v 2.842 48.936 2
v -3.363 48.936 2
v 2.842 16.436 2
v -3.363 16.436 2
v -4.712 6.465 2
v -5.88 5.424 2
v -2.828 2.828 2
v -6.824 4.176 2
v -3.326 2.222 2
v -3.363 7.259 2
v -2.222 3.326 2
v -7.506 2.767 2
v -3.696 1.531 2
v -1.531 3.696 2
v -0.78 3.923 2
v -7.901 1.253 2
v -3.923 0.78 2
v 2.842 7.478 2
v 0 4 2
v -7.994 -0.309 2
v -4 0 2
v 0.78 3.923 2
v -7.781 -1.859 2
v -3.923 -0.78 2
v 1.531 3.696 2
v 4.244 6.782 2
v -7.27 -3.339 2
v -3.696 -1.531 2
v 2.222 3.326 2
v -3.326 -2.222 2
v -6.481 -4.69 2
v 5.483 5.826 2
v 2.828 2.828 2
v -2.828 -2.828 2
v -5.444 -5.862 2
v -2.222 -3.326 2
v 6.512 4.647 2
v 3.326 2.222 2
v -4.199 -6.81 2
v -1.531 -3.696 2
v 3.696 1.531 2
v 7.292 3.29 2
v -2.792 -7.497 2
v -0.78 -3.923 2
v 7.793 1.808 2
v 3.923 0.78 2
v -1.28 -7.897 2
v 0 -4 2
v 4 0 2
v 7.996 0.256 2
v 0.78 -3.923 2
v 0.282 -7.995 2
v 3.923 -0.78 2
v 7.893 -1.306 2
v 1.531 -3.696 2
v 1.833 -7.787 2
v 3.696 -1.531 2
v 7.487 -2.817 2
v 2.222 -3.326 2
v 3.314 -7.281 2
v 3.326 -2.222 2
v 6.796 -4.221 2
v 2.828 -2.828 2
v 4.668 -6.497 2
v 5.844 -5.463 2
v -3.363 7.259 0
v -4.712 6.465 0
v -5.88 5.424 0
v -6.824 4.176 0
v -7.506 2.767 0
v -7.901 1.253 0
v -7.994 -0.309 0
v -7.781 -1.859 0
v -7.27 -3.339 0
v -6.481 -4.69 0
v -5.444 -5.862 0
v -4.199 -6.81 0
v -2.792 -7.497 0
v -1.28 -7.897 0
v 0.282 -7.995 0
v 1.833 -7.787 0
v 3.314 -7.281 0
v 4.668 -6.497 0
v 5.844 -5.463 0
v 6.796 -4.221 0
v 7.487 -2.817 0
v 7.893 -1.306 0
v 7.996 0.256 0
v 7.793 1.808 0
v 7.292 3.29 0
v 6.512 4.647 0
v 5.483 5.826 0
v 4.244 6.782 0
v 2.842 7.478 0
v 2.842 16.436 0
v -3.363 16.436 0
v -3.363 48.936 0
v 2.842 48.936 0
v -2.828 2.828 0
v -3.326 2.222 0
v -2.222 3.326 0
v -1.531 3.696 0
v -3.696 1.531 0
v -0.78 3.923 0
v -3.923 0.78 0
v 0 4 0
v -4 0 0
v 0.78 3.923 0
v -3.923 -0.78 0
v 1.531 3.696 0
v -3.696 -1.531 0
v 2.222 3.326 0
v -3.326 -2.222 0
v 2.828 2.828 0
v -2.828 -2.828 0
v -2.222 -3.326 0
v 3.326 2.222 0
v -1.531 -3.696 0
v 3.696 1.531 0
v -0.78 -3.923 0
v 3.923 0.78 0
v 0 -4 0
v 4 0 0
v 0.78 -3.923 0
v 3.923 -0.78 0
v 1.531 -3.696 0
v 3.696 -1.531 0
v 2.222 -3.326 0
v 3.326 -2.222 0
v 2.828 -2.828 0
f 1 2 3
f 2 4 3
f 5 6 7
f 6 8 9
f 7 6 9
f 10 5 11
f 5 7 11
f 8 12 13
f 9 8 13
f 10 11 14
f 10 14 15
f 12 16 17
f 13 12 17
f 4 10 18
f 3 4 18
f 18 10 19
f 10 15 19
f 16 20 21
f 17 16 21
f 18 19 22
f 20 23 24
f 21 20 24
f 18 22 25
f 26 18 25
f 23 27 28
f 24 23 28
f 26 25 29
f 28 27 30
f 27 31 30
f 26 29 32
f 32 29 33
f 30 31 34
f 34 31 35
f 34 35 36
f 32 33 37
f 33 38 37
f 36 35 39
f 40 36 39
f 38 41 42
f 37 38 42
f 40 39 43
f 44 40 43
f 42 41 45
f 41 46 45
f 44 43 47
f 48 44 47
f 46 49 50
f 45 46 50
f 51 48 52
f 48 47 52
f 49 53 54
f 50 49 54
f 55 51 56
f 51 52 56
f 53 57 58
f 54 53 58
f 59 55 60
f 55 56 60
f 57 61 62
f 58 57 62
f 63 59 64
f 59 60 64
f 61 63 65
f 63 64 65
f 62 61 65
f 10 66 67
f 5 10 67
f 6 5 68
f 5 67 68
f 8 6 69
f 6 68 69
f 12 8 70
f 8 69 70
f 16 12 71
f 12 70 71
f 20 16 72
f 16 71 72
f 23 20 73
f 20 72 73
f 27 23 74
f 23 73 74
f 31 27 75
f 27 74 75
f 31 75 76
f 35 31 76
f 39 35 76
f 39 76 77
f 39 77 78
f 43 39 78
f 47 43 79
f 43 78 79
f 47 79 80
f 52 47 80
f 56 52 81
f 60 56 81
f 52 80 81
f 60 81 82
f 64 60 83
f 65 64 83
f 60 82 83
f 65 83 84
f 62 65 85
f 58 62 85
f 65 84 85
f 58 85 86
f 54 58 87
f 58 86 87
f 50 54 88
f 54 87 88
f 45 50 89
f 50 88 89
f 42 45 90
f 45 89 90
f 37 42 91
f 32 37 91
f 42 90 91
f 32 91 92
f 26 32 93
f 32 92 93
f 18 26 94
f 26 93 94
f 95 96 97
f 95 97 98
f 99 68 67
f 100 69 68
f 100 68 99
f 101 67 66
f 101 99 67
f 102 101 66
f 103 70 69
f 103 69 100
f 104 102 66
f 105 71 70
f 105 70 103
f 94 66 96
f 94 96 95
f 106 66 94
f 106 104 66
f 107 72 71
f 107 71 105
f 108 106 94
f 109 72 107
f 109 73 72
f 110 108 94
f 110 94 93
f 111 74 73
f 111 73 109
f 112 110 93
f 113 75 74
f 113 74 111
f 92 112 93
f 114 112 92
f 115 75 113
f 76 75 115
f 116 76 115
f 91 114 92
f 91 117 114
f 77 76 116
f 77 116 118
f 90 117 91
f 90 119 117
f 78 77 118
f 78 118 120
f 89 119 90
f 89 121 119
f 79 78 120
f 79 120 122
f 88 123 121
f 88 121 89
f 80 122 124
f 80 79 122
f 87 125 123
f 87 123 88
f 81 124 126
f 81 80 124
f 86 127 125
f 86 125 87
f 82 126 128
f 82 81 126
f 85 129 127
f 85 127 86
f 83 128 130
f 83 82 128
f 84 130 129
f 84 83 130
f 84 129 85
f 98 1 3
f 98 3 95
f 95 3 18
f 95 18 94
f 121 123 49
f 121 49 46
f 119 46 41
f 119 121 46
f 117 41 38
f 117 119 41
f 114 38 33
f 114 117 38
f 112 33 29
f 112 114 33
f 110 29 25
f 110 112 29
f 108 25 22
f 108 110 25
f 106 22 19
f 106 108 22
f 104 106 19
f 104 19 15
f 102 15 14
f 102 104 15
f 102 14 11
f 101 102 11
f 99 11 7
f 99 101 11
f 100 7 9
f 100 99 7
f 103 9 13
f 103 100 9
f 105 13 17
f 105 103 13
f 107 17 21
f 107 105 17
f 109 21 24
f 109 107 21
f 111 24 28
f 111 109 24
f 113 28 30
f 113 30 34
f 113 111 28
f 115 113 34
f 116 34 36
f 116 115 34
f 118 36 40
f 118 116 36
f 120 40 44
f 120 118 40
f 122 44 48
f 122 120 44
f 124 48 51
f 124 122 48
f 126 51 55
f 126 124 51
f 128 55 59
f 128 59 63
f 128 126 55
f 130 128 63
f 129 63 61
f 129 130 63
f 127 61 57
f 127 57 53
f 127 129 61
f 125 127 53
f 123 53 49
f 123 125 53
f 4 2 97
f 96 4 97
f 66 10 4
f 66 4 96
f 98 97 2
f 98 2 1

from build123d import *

# Parameters (mm, degrees)
CROQUIS1_R              = 4
SALIENTE_EXTRUIR1_DEPTH = 2
CROQUIS3_W              = 6.205121333
CROQUIS3_H              = 2
SALIENTE_EXTRUIR2_DEPTH = 24.5
CROQUIS4_W              = 6.205121333
CROQUIS4_H              = 2
SALIENTE_EXTRUIR3_DEPTH = 8


with BuildPart() as part:
    # Croquis1 → Saliente-Extruir1 (new body)
    with BuildSketch(Plane.XY):
        with BuildLine():
            Line((-3.36280679, 16.435636067), (-3.36280679, 7.2588932))
            ThreePointArc((-3.36280679, 7.2588932), (0.282374909, -7.995014973), (2.842314543, 7.478051086))
            Line((2.842314543, 7.478051086), (2.842314543, 16.435636067))
            Line((2.842314543, 16.435636067), (-3.36280679, 16.435636067))
        make_face()
        Circle(CROQUIS1_R, mode=Mode.SUBTRACT)
    extrude(amount=SALIENTE_EXTRUIR1_DEPTH)

    # Croquis3 → Saliente-Extruir2 (add)
    with BuildSketch(Plane(origin=(0, 16.435636067, 0), x_dir=(1, 0, 0), z_dir=(0, 1, 0))):
        with Locations((-0.260246123, -1)):
            Rectangle(CROQUIS3_W, CROQUIS3_H)
    extrude(amount=SALIENTE_EXTRUIR2_DEPTH)

    # Croquis4 → Saliente-Extruir3 (add)
    with BuildSketch(Plane(origin=(0, 40.935636067, 0), x_dir=(1, 0, 0), z_dir=(0, 1, 0))):
        with Locations((-0.260246123, -1)):
            Rectangle(CROQUIS4_W, CROQUIS4_H)
    extrude(amount=SALIENTE_EXTRUIR3_DEPTH)


solid = part.part
